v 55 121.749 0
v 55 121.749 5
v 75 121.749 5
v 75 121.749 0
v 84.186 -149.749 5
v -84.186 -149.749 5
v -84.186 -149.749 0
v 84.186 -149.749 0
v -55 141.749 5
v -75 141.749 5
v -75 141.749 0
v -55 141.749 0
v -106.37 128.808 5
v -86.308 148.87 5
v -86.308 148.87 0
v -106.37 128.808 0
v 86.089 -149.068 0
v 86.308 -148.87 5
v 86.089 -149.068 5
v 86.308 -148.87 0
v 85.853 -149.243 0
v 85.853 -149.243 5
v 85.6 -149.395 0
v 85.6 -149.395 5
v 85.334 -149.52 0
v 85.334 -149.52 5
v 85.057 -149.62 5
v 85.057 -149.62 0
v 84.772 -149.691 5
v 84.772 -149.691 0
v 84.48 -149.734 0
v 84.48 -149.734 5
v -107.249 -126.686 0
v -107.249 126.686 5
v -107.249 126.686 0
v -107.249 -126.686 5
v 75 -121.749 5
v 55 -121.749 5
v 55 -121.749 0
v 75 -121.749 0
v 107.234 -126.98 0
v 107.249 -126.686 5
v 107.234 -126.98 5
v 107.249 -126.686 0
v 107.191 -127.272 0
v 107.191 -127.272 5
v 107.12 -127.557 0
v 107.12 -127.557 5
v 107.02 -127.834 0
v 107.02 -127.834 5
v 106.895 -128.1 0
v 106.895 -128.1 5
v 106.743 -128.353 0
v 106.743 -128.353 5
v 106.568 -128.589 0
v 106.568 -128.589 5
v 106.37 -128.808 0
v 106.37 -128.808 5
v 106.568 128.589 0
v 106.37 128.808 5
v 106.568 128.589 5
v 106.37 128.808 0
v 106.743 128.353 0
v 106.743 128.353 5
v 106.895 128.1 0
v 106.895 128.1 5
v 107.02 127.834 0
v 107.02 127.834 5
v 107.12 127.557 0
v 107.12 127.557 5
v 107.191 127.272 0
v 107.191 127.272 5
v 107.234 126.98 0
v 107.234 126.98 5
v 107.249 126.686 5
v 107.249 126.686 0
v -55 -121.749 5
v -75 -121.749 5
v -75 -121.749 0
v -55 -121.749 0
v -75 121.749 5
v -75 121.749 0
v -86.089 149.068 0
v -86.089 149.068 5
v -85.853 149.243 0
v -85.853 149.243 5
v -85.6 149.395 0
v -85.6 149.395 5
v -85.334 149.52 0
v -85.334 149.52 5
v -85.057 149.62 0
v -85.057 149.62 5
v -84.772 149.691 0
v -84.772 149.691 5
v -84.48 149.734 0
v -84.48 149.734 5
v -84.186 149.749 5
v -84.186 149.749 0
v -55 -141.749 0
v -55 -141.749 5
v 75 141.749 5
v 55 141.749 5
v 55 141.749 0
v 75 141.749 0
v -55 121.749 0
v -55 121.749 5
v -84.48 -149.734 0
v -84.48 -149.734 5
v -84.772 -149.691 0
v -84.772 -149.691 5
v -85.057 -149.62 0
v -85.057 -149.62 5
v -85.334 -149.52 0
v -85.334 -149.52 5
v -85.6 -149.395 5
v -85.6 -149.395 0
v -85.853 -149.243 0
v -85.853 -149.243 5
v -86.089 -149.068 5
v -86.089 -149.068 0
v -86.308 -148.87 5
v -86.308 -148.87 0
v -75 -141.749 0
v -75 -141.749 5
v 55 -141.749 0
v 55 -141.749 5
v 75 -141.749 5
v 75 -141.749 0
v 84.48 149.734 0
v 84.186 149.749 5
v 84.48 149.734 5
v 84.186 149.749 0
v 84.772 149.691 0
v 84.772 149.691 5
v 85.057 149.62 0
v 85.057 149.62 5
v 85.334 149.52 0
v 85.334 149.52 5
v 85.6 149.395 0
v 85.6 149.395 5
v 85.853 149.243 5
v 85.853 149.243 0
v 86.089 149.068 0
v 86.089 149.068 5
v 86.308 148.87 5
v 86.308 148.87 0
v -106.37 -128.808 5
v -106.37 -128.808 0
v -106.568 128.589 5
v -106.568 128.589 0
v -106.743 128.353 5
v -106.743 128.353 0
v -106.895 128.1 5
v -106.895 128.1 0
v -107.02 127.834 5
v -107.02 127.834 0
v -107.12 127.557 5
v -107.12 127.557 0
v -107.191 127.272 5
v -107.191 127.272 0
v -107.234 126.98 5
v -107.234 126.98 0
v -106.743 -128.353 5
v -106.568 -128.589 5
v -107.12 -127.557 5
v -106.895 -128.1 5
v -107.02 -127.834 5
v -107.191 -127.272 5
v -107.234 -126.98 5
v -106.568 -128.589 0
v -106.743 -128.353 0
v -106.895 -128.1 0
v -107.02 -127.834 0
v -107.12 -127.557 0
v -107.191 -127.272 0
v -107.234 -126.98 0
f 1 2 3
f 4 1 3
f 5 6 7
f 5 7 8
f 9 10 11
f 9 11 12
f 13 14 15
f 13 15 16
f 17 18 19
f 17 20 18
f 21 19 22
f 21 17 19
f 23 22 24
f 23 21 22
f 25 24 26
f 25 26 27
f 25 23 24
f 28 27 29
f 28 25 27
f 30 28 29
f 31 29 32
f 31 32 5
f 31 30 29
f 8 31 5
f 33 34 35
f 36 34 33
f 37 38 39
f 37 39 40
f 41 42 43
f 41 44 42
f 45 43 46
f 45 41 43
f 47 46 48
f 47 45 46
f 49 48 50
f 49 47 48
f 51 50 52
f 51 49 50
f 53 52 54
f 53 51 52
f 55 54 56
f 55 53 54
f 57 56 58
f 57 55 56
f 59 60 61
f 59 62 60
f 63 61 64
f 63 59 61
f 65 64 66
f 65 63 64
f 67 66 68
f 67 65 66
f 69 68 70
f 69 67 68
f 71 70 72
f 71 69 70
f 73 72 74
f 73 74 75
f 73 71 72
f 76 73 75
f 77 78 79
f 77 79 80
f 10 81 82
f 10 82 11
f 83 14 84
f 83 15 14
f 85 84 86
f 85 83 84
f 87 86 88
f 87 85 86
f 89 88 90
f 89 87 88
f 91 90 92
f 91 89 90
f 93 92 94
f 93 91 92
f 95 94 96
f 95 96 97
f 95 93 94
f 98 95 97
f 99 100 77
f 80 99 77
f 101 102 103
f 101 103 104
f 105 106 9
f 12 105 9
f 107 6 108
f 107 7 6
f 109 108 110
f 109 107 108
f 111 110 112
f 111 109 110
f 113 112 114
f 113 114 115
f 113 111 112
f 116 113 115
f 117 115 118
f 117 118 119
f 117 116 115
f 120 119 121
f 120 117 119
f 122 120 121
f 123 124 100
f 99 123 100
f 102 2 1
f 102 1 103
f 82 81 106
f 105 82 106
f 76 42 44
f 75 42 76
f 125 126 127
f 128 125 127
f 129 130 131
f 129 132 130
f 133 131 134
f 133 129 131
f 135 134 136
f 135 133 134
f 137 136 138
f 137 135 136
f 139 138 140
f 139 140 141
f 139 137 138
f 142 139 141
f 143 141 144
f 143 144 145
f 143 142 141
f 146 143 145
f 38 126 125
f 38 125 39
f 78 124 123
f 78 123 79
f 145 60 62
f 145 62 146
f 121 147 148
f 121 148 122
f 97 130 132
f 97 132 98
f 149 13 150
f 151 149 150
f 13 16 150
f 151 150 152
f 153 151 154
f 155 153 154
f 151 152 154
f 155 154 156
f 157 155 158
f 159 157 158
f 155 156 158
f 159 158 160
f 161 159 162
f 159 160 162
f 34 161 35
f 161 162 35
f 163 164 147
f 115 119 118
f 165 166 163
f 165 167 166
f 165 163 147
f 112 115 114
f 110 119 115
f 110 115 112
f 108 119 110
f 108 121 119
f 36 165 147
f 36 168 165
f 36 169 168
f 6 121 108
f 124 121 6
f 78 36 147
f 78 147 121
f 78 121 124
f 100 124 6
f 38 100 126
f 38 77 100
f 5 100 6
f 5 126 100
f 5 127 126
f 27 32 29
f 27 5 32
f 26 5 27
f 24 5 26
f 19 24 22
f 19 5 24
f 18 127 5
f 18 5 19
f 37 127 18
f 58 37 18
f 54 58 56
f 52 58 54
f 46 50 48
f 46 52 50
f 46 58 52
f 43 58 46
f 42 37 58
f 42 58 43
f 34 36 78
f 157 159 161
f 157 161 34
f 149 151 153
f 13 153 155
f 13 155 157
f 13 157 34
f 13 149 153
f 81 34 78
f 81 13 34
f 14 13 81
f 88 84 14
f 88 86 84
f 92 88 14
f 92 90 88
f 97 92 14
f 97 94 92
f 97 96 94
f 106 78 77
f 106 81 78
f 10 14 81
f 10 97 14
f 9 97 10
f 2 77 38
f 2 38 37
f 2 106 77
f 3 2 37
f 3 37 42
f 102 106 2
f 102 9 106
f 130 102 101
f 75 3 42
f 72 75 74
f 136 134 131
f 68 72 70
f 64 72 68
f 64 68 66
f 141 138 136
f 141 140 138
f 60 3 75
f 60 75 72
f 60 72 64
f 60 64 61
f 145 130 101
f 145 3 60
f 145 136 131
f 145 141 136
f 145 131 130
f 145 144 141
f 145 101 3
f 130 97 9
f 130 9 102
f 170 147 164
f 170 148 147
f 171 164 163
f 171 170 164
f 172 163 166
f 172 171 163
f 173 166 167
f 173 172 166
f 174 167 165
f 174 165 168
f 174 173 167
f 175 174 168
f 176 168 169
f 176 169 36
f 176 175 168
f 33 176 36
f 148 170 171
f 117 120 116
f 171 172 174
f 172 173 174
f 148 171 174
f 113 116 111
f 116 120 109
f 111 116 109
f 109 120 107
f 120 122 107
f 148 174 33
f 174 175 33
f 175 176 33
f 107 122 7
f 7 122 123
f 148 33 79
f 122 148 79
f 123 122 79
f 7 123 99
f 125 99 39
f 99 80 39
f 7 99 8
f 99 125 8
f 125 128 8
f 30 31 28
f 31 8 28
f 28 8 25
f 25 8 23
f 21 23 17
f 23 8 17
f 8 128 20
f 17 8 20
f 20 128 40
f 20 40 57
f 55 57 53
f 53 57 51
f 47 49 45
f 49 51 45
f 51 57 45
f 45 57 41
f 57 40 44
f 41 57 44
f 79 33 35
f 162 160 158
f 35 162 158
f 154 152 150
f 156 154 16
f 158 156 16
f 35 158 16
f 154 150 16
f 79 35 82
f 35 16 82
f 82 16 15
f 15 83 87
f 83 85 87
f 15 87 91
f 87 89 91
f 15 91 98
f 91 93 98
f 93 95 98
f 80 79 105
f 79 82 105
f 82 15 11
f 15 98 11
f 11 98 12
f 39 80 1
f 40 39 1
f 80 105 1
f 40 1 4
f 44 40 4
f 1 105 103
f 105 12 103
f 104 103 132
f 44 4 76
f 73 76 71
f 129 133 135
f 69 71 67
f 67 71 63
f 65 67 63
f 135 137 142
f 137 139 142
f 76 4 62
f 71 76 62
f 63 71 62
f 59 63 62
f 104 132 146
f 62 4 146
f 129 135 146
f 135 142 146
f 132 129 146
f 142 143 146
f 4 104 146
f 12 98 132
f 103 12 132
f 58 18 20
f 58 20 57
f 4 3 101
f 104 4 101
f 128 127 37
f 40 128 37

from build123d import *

# Parameters (mm, degrees)
BOSS_EXTRU_1_DEPTH      = 5
ESQUISSE2_W             = 20
ESQUISSE2_H             = 20
ENL_V_MAT_EXTRU_1_DEPTH = 5
ENL_V_MAT_EXTRU_2_DEPTH = 5
CONG_1_R                = 3


with BuildPart() as part:
    # Esquisse1 → Boss.-Extru.1 (new body)
    with BuildSketch(Plane.XY):
        Polygon((-112.248737342, -130), (-87.5, -154.748737342), (87.5, -154.748737342), (112.248737342, -130), (112.248737342, 130), (87.5, 154.748737342), (-87.5, 154.748737342), (-112.248737342, 130), align=None)
    extrude(amount=BOSS_EXTRU_1_DEPTH)

    # Esquisse2 → Enlèv. mat.-Extru.1 (cut)
    with BuildSketch(Plane.XY.offset(5)):
        with Locations((-65, 131.748737342)):
            Rectangle(ESQUISSE2_W, ESQUISSE2_H)
        with Locations((-65, -131.748737342)):
            Rectangle(ESQUISSE2_W, ESQUISSE2_H)
        with Locations((65, -131.748737342)):
            Rectangle(ESQUISSE2_W, ESQUISSE2_H)
        with Locations((65, 131.748737342)):
            Rectangle(ESQUISSE2_W, ESQUISSE2_H)
    extrude(amount=-ENL_V_MAT_EXTRU_1_DEPTH, mode=Mode.SUBTRACT)

    # Esquisse3 → Enlèv. mat.-Extru.2 (cut)
    with BuildSketch(Plane.XY.offset(5)):
        Polygon((-87.5, 154.748737342), (-112.248737342, 130), (-112.248737342, -130), (-87.5, -154.748737342), (87.5, -154.748737342), (112.248737342, -130), (112.248737342, 130), (87.5, 154.748737342), align=None)
        Polygon((-107.248737342, 127.928932188), (-107.248737342, -127.928932188), (-85.428932188, -149.748737342), (85.428932188, -149.748737342), (107.248737342, -127.928932188), (107.248737342, 127.928932188), (85.428932188, 149.748737342), (-85.428932188, 149.748737342), align=None, mode=Mode.SUBTRACT)
    extrude(amount=-ENL_V_MAT_EXTRU_2_DEPTH, mode=Mode.SUBTRACT)

    # Congé1
    cong_1_edges = [part.edges().sort_by_distance(p)[0] for p in [
        (-85.428932188, 149.748737342, 2.5),
        (85.428932188, 149.748737342, 2.5),
        (107.248737342, 127.928932188, 2.5),
        (107.248737342, -127.928932188, 2.5),
        (85.428932188, -149.748737342, 2.5),
        (-85.428932188, -149.748737342, 2.5),
        (-107.248737342, -127.928932188, 2.5),
        (-107.248737342, 127.928932188, 2.5),
    ]]
    fillet(cong_1_edges, radius=CONG_1_R)


solid = part.part
